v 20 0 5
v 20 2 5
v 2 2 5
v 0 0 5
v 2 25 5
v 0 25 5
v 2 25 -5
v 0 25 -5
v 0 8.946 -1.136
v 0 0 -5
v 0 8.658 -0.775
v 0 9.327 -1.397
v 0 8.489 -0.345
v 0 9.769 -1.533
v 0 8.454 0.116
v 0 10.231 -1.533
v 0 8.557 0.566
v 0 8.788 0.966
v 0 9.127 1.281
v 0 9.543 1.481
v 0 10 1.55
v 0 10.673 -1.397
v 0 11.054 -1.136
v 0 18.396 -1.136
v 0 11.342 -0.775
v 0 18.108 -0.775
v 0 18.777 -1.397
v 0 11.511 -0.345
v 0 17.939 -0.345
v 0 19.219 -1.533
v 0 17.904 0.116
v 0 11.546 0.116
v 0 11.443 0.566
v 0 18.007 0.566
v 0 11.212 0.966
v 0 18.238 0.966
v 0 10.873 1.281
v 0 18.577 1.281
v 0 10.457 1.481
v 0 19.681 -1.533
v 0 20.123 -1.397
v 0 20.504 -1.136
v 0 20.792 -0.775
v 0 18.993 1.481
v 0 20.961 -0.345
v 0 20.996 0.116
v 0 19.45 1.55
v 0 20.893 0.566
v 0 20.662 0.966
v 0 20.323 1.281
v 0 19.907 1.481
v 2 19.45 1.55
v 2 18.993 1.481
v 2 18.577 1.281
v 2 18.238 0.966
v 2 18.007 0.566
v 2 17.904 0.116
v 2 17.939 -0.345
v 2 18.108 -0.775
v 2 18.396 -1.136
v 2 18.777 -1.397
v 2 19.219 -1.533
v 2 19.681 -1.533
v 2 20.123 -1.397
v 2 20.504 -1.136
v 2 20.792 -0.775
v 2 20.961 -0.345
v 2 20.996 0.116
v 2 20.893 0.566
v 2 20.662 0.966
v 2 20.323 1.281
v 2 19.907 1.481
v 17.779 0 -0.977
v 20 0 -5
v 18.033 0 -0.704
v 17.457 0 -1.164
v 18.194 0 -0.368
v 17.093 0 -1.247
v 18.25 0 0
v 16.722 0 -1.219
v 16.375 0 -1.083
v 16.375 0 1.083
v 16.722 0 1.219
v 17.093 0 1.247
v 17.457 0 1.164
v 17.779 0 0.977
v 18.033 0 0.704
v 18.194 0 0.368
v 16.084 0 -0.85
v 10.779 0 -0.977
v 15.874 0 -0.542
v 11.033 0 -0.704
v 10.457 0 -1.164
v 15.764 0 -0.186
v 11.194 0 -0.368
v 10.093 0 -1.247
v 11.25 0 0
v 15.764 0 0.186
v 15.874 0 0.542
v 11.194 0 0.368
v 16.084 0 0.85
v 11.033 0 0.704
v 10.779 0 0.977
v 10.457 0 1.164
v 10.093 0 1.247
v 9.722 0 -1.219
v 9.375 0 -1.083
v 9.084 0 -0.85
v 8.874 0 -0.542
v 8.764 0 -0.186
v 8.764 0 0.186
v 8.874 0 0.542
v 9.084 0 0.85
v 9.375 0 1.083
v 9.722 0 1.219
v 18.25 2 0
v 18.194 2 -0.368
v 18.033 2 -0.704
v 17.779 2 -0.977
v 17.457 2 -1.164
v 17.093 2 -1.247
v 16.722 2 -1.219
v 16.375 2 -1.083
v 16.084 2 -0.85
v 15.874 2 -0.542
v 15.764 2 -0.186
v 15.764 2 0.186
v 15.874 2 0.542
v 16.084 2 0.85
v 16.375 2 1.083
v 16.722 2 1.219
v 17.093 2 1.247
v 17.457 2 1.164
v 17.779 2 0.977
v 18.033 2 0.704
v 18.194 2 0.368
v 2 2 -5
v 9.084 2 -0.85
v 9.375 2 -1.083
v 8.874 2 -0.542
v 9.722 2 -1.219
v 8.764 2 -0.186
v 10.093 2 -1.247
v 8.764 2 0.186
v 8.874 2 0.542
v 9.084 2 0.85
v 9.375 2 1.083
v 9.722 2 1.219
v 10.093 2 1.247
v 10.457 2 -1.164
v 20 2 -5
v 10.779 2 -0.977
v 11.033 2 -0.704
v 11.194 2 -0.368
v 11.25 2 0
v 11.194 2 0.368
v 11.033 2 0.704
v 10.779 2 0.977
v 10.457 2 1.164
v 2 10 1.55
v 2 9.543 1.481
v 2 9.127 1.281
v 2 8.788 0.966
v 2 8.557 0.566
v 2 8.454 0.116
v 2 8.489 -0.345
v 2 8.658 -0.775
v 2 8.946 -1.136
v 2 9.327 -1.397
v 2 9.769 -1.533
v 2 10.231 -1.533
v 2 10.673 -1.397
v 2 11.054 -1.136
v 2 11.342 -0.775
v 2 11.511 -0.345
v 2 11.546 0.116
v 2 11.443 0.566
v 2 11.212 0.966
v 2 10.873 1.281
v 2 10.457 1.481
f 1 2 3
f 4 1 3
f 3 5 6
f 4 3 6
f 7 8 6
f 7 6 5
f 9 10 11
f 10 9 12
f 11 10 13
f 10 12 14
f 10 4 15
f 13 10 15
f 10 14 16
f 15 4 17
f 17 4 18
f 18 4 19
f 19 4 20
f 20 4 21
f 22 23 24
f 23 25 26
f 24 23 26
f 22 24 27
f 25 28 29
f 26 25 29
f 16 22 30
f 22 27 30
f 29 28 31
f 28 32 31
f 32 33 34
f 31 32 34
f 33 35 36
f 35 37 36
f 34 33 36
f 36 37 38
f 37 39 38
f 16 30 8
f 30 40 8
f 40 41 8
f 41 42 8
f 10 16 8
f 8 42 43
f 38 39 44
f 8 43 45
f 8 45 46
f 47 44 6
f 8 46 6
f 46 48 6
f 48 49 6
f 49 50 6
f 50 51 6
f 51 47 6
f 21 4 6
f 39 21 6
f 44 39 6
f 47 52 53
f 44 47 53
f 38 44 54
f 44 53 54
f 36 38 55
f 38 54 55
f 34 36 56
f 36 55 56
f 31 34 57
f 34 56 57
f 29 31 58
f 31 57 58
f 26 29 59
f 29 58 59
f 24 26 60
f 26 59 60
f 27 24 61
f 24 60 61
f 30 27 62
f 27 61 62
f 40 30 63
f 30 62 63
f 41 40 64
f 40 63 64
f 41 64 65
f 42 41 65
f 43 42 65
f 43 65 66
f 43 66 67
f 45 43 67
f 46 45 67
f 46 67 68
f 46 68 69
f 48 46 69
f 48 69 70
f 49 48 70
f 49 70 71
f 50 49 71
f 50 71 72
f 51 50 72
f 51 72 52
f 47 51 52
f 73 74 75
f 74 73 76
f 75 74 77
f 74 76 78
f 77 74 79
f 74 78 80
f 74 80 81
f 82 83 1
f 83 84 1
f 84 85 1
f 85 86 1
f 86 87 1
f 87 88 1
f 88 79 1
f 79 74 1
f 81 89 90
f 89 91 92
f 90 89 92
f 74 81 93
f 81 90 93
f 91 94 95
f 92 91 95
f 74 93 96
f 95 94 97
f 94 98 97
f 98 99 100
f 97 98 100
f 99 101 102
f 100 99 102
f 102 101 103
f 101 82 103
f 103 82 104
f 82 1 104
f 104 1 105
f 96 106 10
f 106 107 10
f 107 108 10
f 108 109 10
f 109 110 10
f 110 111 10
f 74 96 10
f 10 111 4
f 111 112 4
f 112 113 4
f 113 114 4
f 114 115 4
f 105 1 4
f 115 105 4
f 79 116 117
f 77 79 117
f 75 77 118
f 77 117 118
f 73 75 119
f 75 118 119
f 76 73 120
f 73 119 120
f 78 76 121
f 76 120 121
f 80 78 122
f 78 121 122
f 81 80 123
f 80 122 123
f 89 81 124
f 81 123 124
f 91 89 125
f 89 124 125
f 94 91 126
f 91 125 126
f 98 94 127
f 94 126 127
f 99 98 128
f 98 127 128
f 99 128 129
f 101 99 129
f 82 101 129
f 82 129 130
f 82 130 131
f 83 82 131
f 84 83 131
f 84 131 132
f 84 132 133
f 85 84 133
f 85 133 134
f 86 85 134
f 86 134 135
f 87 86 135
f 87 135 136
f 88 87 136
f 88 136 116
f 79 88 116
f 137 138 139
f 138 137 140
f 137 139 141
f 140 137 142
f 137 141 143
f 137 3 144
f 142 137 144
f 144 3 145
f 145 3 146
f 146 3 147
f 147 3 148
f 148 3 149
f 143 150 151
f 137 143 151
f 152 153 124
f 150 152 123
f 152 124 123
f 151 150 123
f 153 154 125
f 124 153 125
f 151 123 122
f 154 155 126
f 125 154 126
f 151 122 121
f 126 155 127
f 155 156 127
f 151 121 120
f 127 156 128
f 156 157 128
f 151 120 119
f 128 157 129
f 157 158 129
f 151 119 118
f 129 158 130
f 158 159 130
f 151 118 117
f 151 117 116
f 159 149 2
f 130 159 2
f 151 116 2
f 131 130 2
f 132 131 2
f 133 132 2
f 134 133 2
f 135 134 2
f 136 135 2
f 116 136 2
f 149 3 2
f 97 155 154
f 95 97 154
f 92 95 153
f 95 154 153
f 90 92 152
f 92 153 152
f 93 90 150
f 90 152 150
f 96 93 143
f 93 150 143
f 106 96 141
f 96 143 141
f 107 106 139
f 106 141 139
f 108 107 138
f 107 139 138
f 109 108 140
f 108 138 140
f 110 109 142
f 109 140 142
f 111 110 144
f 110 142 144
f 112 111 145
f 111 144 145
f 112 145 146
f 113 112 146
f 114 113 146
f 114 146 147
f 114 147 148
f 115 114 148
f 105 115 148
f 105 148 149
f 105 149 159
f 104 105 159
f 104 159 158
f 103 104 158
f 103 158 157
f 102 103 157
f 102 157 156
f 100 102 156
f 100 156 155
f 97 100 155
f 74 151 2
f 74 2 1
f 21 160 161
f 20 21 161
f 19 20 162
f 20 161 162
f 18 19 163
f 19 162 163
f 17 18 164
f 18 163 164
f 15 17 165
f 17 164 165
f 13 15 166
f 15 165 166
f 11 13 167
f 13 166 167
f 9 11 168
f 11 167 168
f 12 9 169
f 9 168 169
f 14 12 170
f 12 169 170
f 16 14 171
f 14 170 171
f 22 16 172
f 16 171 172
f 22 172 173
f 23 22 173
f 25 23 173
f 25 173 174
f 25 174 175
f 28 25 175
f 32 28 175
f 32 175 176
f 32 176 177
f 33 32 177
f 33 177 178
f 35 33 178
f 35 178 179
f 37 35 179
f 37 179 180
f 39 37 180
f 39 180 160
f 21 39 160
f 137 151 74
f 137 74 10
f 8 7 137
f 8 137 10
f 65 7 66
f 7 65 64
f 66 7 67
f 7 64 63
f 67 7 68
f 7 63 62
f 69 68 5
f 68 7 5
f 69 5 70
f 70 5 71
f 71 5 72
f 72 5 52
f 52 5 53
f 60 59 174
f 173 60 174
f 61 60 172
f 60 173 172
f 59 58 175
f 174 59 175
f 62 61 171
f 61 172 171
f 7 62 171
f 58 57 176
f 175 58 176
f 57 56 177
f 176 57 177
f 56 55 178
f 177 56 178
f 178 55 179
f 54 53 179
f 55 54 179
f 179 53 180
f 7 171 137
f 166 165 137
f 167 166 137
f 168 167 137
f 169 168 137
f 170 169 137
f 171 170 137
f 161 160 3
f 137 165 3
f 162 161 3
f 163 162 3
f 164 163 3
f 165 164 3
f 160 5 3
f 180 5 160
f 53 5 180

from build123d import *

# Parameters (mm, degrees)
BASE_DEPTH                   = 5
M3X0_5_MOUNTHOLES_D          = 2.5
F_3_1_3_1_LIMITSWITCHHOLES_D = 3.1


with BuildPart() as part:
    # Sketch1 → Base (new body, symmetric)
    with BuildSketch(Plane.XY):
        Polygon((0, 0), (0, 25), (2, 25), (2, 2), (20, 2), (20, 0), align=None)
    extrude(amount=BASE_DEPTH, both=True)

    # M3x0.5 MountHoles (through all)
    with Locations(Plane(origin=(0, 0, 0), x_dir=(-1, 0, 0), z_dir=(0, -1, 0))):
        with Locations((-10, 0), (-17, 0)):
            Hole(M3X0_5_MOUNTHOLES_D / 2)

    # Ø3.1 (3.1) LimitSwitchHoles (through all)
    with Locations(Plane(origin=(0, 10, 0), x_dir=(0, 0, -1), z_dir=(-1, 0, 0))):
        with Locations((0, 0), (0, -9.45)):
            Hole(F_3_1_3_1_LIMITSWITCHHOLES_D / 2)


solid = part.part
